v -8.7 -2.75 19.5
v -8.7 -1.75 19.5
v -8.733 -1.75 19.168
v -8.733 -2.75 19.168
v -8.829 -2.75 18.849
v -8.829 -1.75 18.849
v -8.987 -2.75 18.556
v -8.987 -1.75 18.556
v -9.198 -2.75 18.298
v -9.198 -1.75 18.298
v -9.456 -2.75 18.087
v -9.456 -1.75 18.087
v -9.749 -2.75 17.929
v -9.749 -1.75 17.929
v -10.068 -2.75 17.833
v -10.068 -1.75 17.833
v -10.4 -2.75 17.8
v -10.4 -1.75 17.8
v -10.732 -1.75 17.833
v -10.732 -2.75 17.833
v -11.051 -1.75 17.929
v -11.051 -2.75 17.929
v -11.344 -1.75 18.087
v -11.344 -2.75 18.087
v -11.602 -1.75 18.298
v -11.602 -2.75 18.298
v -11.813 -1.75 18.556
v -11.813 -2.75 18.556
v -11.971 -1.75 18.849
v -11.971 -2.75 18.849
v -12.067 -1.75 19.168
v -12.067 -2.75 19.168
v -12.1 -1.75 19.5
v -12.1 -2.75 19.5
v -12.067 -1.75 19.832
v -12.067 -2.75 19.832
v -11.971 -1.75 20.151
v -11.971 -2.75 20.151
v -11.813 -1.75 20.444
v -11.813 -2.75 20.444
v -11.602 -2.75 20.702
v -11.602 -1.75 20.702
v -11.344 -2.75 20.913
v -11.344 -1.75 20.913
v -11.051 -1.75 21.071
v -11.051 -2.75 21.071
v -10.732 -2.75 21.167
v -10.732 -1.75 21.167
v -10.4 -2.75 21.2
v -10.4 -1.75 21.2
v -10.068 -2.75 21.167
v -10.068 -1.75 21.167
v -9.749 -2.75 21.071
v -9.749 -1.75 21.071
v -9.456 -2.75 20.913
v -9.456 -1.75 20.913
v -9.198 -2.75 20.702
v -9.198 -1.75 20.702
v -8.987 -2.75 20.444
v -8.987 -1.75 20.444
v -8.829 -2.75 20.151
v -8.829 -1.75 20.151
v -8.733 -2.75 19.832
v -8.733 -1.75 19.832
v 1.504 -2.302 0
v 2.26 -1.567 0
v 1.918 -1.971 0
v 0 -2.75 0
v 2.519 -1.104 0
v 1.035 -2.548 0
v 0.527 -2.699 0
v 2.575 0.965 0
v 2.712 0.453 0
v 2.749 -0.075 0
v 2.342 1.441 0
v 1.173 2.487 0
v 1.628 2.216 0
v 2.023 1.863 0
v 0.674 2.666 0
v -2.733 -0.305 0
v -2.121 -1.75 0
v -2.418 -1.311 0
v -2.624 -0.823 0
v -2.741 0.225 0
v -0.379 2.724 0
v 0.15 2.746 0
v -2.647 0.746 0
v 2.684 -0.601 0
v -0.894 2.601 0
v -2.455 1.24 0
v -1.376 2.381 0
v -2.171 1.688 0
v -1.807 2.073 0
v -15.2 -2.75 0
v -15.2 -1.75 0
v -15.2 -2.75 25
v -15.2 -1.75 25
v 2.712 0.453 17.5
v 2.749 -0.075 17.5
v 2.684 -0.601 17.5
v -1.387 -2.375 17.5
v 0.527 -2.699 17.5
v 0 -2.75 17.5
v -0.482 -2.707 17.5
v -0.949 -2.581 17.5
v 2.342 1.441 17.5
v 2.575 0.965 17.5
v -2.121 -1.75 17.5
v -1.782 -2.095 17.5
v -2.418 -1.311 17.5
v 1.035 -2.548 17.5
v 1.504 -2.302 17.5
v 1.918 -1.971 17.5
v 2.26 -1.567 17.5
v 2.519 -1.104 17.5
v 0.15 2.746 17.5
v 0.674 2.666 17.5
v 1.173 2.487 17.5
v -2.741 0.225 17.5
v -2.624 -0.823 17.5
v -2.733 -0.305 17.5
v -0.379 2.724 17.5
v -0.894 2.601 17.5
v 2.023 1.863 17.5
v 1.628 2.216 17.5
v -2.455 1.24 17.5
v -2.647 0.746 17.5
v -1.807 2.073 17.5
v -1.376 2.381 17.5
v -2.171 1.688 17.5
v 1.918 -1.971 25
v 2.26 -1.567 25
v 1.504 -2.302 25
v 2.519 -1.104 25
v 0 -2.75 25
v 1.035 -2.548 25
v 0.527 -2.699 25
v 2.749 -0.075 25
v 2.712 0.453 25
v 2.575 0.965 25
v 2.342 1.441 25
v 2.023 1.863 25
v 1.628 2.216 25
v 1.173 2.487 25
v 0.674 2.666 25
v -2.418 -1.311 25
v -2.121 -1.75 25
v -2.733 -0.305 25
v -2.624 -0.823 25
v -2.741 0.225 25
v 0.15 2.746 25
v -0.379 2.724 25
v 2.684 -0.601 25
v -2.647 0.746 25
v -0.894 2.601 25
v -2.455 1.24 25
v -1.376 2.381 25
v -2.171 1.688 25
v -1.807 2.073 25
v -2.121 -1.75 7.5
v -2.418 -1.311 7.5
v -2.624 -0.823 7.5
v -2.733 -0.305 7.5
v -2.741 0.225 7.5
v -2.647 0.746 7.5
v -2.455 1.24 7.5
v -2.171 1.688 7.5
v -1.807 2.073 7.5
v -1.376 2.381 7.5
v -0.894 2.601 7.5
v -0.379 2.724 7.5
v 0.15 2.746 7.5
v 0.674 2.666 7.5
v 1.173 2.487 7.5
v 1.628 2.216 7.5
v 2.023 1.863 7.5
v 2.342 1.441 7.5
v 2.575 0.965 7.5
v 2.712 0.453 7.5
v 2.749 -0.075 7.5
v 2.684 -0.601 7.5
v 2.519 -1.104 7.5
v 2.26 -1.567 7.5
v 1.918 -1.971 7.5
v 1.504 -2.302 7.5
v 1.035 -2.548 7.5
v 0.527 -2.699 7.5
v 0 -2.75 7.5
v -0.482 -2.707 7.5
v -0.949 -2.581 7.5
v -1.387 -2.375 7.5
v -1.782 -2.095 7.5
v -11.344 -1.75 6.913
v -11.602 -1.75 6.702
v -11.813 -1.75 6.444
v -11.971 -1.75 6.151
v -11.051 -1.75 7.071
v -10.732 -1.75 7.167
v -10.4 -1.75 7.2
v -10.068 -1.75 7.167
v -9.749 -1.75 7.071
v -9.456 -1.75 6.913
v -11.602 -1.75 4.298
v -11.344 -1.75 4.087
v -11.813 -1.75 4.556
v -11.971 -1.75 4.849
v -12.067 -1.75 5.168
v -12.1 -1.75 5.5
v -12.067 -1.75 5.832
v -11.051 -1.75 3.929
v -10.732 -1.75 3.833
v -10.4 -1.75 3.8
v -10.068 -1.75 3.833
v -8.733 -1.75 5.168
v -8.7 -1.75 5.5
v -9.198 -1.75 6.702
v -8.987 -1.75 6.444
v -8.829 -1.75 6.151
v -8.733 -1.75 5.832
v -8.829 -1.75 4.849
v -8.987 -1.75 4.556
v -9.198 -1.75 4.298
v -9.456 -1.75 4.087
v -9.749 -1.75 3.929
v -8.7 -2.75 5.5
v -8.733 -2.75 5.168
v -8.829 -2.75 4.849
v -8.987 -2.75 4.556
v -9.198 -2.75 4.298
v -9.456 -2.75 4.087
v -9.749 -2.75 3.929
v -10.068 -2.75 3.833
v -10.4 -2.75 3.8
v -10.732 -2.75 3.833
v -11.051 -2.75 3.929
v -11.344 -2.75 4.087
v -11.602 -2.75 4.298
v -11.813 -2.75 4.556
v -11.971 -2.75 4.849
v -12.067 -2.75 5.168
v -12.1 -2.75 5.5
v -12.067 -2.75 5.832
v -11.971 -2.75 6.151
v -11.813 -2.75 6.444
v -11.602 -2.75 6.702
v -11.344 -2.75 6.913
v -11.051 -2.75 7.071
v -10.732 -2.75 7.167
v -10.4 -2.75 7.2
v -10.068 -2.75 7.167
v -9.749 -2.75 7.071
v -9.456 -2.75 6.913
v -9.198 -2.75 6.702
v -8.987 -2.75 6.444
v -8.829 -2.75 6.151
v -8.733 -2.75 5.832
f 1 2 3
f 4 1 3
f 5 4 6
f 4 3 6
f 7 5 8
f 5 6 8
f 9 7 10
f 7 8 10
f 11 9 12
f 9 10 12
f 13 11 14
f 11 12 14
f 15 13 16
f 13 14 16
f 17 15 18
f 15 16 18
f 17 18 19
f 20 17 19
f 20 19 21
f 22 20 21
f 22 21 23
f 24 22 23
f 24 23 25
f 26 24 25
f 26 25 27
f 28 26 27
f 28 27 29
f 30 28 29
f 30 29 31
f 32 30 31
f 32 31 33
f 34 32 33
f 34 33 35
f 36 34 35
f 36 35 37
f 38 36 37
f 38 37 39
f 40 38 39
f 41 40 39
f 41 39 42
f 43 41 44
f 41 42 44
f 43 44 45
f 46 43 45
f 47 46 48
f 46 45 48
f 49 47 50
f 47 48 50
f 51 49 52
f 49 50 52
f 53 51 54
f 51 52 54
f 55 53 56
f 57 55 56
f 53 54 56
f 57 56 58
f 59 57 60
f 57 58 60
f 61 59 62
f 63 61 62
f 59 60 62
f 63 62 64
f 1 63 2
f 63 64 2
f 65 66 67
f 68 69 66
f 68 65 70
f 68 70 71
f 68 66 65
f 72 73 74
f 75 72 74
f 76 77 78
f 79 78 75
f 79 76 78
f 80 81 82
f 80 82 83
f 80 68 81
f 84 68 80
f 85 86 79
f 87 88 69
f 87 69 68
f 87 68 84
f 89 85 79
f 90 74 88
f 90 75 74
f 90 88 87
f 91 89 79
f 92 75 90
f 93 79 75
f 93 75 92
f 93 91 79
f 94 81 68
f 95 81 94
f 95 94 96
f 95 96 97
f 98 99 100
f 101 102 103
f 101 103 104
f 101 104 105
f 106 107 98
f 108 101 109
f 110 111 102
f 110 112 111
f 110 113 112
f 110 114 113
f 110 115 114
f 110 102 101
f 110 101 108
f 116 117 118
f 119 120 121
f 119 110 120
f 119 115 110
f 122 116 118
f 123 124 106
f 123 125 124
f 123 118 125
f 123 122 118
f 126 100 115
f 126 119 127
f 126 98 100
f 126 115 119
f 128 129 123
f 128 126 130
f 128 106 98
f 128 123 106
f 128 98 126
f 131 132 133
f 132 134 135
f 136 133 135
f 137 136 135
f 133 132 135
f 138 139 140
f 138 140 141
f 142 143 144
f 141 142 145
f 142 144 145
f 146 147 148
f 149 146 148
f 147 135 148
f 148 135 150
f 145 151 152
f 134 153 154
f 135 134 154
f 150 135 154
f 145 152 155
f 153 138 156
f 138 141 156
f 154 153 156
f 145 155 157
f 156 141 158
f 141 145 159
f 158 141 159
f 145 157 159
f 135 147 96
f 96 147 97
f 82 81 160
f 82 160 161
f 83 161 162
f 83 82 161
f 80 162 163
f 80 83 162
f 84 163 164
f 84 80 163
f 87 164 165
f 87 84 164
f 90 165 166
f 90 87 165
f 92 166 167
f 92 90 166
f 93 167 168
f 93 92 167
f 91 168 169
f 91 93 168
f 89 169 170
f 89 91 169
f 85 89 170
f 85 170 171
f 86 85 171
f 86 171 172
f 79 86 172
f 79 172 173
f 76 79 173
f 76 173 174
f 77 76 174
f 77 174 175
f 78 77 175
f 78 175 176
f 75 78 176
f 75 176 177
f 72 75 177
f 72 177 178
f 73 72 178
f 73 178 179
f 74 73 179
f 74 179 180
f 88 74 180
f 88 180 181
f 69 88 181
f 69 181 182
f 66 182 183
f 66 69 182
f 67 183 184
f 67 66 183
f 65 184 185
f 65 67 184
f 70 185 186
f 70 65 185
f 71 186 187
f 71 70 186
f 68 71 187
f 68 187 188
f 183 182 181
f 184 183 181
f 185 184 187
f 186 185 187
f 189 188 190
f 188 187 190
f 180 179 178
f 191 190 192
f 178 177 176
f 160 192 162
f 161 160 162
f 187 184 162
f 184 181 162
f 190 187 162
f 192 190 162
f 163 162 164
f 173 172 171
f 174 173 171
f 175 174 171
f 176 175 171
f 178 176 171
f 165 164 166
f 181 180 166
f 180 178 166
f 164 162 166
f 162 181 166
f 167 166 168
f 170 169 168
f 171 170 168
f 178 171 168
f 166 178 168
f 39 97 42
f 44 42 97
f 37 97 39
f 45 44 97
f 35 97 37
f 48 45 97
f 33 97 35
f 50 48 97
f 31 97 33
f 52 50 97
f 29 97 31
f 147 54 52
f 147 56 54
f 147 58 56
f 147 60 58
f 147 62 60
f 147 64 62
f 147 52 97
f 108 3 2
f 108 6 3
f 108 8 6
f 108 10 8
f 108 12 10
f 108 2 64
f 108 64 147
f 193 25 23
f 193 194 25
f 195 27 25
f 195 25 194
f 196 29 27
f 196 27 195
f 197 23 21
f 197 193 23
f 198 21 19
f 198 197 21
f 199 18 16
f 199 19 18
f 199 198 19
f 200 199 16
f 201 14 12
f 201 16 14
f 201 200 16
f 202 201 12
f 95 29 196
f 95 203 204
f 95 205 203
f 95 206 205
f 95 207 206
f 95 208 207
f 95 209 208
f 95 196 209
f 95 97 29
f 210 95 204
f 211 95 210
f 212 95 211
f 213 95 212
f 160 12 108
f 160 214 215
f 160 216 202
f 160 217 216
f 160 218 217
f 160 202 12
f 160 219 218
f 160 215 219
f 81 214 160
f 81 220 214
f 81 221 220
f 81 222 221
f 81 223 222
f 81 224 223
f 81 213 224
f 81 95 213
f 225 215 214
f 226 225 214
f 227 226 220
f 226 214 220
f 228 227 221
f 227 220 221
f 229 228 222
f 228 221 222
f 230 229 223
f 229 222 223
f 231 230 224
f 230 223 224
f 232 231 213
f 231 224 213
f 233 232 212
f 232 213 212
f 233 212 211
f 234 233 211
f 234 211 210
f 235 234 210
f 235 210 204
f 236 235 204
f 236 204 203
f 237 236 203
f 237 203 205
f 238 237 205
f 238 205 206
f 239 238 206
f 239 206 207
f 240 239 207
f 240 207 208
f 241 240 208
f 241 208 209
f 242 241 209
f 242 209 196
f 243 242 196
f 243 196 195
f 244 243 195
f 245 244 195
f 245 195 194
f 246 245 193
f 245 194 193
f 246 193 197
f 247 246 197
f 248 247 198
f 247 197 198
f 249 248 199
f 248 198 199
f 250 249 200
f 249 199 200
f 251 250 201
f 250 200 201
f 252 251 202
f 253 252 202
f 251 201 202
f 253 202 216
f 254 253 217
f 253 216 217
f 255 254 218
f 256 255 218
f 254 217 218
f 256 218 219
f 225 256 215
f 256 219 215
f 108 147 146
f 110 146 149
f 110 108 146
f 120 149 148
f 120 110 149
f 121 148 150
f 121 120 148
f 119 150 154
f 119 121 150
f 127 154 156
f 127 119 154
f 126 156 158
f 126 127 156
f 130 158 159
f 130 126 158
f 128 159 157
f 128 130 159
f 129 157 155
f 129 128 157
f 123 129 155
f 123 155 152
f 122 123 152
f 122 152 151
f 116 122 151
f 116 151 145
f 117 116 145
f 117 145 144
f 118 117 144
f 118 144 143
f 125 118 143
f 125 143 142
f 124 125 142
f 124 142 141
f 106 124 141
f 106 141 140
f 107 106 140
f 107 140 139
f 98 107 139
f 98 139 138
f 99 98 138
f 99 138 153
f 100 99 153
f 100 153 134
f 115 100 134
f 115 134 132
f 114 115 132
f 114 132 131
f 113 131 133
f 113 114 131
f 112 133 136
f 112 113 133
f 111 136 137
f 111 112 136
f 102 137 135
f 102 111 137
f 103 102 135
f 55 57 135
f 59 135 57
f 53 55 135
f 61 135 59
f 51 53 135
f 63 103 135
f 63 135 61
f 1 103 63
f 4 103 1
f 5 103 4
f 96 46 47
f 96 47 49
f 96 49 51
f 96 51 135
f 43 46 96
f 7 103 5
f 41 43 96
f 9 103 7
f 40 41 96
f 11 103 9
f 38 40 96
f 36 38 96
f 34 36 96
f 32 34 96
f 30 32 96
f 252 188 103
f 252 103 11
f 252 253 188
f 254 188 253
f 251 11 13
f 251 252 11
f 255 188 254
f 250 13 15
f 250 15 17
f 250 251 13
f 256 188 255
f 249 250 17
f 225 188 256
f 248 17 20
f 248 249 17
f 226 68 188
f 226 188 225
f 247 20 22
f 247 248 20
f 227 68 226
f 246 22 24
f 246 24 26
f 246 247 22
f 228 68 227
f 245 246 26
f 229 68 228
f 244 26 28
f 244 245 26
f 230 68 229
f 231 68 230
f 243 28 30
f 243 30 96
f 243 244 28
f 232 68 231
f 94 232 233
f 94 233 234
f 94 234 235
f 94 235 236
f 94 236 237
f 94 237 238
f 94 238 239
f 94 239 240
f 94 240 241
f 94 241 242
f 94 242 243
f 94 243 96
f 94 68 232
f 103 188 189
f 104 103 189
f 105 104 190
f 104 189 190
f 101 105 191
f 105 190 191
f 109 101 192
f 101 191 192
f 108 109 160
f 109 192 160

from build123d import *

# Parameters (mm, degrees)
EXTRUDE_1_DEPTH     = 25
SKETCH_2_R          = 1.7
CUT_EXTRUDE_1_DEPTH = 25
CUT_EXTRUDE_START   = -7.5
SKETCH_3_R          = 2.75
CUT_EXTRUDE_2_DEPTH = 10


with BuildPart() as part:
    # 草图1 → 凸台-拉伸1 (new body)
    with BuildSketch(Plane.XY):
        with BuildLine():
            Line((0, -2.75), (-15.2, -2.75))
            Line((-15.2, -2.75), (-15.2, -1.75))
            Line((-15.2, -1.75), (-2.121320344, -1.75))
            ThreePointArc((-2.121320344, -1.75), (1.17260394, 2.487468593), (0, -2.75))
        make_face()
    extrude(amount=EXTRUDE_1_DEPTH)

    # 草图2 → 切除-拉伸1 (cut)
    with BuildSketch(Plane(origin=(0, -1.75, 0), x_dir=(1, 0, 0), z_dir=(0, 1, 0))):
        with Locations((-10.4, -5.5)):
            Circle(SKETCH_2_R)
        with Locations((-10.4, -19.5)):
            Circle(SKETCH_2_R)
    extrude(amount=-CUT_EXTRUDE_1_DEPTH, mode=Mode.SUBTRACT)

    # 草图3 → 切除-拉伸2 (cut)
    with BuildSketch(Plane(origin=(0, 0, 0), x_dir=(-1, 0, 0), z_dir=(0, 0, -1)).offset(CUT_EXTRUDE_START)):
        Circle(SKETCH_3_R)
    extrude(amount=-CUT_EXTRUDE_2_DEPTH, mode=Mode.SUBTRACT)


solid = part.part
